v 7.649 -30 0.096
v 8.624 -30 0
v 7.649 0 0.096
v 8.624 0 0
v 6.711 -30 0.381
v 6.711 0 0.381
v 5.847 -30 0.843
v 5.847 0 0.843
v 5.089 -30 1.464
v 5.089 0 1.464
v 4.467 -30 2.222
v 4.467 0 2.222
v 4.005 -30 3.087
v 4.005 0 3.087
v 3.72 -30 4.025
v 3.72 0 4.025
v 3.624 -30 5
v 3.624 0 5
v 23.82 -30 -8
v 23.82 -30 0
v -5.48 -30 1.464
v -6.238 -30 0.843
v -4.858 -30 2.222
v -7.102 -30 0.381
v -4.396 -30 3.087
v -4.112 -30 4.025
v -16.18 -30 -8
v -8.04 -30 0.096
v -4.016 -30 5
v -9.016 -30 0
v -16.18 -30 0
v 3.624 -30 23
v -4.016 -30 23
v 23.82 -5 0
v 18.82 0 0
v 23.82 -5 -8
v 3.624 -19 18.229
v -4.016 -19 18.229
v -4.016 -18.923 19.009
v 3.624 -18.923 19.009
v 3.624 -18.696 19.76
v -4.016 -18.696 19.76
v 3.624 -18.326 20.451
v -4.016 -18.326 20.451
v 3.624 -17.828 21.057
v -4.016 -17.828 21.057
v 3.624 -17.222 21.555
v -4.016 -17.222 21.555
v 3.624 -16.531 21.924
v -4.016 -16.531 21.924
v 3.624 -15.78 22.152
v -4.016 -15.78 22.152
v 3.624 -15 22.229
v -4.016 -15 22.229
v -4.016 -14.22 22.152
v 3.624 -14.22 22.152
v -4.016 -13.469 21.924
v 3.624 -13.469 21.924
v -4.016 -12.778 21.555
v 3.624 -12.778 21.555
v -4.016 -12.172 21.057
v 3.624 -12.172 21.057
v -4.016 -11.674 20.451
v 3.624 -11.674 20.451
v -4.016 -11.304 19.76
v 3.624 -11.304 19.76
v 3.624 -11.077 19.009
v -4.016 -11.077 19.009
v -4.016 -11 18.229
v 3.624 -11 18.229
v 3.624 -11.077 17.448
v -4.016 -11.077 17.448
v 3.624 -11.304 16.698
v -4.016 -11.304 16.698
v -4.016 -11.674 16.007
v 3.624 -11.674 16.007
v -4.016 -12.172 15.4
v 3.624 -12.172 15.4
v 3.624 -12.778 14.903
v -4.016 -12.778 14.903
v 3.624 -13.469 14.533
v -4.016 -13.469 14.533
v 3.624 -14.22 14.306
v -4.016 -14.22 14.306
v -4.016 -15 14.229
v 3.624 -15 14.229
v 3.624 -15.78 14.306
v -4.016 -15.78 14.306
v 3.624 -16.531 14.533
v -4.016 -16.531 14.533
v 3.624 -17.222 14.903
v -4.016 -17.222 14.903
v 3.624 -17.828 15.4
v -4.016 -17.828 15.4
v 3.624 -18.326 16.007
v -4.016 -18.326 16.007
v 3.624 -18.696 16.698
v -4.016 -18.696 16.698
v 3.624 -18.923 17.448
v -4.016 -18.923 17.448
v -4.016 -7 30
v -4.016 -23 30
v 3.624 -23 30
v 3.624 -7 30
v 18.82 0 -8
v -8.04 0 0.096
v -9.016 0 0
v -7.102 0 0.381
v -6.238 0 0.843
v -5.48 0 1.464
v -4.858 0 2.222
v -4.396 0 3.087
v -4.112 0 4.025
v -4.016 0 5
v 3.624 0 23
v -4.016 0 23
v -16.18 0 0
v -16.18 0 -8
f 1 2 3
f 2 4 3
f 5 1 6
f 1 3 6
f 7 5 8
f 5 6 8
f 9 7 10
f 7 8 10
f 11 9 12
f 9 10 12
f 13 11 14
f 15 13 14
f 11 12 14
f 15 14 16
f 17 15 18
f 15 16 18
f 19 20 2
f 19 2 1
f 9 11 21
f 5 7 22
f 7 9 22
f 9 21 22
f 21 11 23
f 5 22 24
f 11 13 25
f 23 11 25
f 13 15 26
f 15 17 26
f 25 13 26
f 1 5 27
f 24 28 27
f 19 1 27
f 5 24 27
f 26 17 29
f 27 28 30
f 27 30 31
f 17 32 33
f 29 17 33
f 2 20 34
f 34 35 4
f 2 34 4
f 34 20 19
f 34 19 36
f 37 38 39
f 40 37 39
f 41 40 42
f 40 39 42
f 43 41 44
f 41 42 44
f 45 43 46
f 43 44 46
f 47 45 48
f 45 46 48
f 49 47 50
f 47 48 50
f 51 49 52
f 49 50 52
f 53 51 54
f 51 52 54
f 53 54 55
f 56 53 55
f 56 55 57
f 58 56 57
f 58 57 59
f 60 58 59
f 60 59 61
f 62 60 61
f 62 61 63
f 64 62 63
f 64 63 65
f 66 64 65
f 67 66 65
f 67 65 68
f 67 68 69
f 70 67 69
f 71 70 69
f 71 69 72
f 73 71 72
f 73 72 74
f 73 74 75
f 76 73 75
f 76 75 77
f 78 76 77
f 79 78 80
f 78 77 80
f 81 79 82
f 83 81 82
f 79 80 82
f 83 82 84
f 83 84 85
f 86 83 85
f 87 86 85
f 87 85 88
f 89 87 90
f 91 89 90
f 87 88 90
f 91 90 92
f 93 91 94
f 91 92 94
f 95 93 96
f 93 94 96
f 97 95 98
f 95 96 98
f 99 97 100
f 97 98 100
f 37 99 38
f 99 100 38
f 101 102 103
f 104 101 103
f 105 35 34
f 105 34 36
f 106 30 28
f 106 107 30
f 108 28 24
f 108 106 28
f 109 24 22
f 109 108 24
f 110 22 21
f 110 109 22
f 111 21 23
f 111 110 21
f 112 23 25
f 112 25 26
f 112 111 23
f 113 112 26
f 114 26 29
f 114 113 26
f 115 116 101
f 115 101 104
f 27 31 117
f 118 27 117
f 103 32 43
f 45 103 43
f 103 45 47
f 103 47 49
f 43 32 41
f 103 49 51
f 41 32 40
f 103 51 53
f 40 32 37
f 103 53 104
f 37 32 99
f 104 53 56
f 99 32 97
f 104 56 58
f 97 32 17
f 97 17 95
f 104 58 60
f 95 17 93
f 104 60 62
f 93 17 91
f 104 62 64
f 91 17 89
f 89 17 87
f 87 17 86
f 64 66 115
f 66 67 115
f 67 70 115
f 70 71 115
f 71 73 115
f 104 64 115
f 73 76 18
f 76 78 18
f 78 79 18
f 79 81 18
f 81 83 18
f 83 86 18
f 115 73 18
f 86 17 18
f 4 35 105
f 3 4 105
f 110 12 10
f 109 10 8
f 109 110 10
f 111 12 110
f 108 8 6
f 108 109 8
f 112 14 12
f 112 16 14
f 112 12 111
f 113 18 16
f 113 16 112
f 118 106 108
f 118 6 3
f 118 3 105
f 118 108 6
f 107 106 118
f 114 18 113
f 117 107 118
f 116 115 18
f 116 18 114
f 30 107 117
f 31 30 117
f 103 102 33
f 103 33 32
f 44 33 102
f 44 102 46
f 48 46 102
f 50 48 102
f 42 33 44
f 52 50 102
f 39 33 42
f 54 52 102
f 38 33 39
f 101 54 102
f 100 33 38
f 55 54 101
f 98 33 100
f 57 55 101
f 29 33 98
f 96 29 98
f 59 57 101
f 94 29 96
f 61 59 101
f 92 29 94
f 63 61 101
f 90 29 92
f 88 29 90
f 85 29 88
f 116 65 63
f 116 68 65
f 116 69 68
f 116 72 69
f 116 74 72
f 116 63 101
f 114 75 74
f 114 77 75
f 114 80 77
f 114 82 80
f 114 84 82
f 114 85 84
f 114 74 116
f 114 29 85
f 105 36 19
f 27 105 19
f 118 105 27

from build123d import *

# Parameters (mm, degrees)
SKETCH_1_W          = 7.64
SKETCH_1_H          = 30
EXTRUDE_1_DEPTH     = 30
SKETCH_2_W          = 40
SKETCH_2_H          = 29.999999992
EXTRUDE_2_DEPTH     = 8
FILLET_1_R          = 5
CHAMFER_1_SIZE      = 7
SKETCH_3_R          = 4
CUT_EXTRUDE_1_DEPTH = 51.742711323
CHAMFER_2_SIZE      = 5


with BuildPart() as part:
    # Эскиз1 → Вытянуть1 (new body)
    with BuildSketch(Plane.XY):
        with Locations((-0.195638171, -15)):
            Rectangle(SKETCH_1_W, SKETCH_1_H)
    extrude(amount=EXTRUDE_1_DEPTH)

    # Эскиз2 → Вытянуть2 (add)
    with BuildSketch(Plane(origin=(0, 0, 0), x_dir=(-1, 0, 0), z_dir=(0, 0, -1))):
        with Locations((-3.82, -14.999999996)):
            Rectangle(SKETCH_2_W, SKETCH_2_H)
    extrude(amount=EXTRUDE_2_DEPTH)

    # Скругление1
    fillet_1_edges = [part.edges().sort_by_distance(p)[0] for p in [
        (-4.015638171, -15, 0),
        (3.624361829, -15, 0),
    ]]
    fillet(fillet_1_edges, radius=FILLET_1_R)

    # Фаска1
    chamfer_1_edges = [part.edges().sort_by_distance(p)[0] for p in [
        (-0.195638171, -30, 30),
        (-0.195638171, 0, 30),
    ]]
    chamfer(chamfer_1_edges, length=CHAMFER_1_SIZE)

    # Эскиз3 → Вырез-Вытянуть1 (cut, through all)
    with BuildSketch(Plane.ZY.offset(4.015638171)):
        with Locations(Location((18.228841689, -15, 0), (0, 0, 270))):
            Circle(SKETCH_3_R)
    extrude(amount=-CUT_EXTRUDE_1_DEPTH, mode=Mode.SUBTRACT)

    # Фаска2
    chamfer_2_edges = [part.edges().sort_by_distance(p)[0] for p in [
        (23.82, 0, -4),
    ]]
    chamfer(chamfer_2_edges, length=CHAMFER_2_SIZE)


solid = part.part
